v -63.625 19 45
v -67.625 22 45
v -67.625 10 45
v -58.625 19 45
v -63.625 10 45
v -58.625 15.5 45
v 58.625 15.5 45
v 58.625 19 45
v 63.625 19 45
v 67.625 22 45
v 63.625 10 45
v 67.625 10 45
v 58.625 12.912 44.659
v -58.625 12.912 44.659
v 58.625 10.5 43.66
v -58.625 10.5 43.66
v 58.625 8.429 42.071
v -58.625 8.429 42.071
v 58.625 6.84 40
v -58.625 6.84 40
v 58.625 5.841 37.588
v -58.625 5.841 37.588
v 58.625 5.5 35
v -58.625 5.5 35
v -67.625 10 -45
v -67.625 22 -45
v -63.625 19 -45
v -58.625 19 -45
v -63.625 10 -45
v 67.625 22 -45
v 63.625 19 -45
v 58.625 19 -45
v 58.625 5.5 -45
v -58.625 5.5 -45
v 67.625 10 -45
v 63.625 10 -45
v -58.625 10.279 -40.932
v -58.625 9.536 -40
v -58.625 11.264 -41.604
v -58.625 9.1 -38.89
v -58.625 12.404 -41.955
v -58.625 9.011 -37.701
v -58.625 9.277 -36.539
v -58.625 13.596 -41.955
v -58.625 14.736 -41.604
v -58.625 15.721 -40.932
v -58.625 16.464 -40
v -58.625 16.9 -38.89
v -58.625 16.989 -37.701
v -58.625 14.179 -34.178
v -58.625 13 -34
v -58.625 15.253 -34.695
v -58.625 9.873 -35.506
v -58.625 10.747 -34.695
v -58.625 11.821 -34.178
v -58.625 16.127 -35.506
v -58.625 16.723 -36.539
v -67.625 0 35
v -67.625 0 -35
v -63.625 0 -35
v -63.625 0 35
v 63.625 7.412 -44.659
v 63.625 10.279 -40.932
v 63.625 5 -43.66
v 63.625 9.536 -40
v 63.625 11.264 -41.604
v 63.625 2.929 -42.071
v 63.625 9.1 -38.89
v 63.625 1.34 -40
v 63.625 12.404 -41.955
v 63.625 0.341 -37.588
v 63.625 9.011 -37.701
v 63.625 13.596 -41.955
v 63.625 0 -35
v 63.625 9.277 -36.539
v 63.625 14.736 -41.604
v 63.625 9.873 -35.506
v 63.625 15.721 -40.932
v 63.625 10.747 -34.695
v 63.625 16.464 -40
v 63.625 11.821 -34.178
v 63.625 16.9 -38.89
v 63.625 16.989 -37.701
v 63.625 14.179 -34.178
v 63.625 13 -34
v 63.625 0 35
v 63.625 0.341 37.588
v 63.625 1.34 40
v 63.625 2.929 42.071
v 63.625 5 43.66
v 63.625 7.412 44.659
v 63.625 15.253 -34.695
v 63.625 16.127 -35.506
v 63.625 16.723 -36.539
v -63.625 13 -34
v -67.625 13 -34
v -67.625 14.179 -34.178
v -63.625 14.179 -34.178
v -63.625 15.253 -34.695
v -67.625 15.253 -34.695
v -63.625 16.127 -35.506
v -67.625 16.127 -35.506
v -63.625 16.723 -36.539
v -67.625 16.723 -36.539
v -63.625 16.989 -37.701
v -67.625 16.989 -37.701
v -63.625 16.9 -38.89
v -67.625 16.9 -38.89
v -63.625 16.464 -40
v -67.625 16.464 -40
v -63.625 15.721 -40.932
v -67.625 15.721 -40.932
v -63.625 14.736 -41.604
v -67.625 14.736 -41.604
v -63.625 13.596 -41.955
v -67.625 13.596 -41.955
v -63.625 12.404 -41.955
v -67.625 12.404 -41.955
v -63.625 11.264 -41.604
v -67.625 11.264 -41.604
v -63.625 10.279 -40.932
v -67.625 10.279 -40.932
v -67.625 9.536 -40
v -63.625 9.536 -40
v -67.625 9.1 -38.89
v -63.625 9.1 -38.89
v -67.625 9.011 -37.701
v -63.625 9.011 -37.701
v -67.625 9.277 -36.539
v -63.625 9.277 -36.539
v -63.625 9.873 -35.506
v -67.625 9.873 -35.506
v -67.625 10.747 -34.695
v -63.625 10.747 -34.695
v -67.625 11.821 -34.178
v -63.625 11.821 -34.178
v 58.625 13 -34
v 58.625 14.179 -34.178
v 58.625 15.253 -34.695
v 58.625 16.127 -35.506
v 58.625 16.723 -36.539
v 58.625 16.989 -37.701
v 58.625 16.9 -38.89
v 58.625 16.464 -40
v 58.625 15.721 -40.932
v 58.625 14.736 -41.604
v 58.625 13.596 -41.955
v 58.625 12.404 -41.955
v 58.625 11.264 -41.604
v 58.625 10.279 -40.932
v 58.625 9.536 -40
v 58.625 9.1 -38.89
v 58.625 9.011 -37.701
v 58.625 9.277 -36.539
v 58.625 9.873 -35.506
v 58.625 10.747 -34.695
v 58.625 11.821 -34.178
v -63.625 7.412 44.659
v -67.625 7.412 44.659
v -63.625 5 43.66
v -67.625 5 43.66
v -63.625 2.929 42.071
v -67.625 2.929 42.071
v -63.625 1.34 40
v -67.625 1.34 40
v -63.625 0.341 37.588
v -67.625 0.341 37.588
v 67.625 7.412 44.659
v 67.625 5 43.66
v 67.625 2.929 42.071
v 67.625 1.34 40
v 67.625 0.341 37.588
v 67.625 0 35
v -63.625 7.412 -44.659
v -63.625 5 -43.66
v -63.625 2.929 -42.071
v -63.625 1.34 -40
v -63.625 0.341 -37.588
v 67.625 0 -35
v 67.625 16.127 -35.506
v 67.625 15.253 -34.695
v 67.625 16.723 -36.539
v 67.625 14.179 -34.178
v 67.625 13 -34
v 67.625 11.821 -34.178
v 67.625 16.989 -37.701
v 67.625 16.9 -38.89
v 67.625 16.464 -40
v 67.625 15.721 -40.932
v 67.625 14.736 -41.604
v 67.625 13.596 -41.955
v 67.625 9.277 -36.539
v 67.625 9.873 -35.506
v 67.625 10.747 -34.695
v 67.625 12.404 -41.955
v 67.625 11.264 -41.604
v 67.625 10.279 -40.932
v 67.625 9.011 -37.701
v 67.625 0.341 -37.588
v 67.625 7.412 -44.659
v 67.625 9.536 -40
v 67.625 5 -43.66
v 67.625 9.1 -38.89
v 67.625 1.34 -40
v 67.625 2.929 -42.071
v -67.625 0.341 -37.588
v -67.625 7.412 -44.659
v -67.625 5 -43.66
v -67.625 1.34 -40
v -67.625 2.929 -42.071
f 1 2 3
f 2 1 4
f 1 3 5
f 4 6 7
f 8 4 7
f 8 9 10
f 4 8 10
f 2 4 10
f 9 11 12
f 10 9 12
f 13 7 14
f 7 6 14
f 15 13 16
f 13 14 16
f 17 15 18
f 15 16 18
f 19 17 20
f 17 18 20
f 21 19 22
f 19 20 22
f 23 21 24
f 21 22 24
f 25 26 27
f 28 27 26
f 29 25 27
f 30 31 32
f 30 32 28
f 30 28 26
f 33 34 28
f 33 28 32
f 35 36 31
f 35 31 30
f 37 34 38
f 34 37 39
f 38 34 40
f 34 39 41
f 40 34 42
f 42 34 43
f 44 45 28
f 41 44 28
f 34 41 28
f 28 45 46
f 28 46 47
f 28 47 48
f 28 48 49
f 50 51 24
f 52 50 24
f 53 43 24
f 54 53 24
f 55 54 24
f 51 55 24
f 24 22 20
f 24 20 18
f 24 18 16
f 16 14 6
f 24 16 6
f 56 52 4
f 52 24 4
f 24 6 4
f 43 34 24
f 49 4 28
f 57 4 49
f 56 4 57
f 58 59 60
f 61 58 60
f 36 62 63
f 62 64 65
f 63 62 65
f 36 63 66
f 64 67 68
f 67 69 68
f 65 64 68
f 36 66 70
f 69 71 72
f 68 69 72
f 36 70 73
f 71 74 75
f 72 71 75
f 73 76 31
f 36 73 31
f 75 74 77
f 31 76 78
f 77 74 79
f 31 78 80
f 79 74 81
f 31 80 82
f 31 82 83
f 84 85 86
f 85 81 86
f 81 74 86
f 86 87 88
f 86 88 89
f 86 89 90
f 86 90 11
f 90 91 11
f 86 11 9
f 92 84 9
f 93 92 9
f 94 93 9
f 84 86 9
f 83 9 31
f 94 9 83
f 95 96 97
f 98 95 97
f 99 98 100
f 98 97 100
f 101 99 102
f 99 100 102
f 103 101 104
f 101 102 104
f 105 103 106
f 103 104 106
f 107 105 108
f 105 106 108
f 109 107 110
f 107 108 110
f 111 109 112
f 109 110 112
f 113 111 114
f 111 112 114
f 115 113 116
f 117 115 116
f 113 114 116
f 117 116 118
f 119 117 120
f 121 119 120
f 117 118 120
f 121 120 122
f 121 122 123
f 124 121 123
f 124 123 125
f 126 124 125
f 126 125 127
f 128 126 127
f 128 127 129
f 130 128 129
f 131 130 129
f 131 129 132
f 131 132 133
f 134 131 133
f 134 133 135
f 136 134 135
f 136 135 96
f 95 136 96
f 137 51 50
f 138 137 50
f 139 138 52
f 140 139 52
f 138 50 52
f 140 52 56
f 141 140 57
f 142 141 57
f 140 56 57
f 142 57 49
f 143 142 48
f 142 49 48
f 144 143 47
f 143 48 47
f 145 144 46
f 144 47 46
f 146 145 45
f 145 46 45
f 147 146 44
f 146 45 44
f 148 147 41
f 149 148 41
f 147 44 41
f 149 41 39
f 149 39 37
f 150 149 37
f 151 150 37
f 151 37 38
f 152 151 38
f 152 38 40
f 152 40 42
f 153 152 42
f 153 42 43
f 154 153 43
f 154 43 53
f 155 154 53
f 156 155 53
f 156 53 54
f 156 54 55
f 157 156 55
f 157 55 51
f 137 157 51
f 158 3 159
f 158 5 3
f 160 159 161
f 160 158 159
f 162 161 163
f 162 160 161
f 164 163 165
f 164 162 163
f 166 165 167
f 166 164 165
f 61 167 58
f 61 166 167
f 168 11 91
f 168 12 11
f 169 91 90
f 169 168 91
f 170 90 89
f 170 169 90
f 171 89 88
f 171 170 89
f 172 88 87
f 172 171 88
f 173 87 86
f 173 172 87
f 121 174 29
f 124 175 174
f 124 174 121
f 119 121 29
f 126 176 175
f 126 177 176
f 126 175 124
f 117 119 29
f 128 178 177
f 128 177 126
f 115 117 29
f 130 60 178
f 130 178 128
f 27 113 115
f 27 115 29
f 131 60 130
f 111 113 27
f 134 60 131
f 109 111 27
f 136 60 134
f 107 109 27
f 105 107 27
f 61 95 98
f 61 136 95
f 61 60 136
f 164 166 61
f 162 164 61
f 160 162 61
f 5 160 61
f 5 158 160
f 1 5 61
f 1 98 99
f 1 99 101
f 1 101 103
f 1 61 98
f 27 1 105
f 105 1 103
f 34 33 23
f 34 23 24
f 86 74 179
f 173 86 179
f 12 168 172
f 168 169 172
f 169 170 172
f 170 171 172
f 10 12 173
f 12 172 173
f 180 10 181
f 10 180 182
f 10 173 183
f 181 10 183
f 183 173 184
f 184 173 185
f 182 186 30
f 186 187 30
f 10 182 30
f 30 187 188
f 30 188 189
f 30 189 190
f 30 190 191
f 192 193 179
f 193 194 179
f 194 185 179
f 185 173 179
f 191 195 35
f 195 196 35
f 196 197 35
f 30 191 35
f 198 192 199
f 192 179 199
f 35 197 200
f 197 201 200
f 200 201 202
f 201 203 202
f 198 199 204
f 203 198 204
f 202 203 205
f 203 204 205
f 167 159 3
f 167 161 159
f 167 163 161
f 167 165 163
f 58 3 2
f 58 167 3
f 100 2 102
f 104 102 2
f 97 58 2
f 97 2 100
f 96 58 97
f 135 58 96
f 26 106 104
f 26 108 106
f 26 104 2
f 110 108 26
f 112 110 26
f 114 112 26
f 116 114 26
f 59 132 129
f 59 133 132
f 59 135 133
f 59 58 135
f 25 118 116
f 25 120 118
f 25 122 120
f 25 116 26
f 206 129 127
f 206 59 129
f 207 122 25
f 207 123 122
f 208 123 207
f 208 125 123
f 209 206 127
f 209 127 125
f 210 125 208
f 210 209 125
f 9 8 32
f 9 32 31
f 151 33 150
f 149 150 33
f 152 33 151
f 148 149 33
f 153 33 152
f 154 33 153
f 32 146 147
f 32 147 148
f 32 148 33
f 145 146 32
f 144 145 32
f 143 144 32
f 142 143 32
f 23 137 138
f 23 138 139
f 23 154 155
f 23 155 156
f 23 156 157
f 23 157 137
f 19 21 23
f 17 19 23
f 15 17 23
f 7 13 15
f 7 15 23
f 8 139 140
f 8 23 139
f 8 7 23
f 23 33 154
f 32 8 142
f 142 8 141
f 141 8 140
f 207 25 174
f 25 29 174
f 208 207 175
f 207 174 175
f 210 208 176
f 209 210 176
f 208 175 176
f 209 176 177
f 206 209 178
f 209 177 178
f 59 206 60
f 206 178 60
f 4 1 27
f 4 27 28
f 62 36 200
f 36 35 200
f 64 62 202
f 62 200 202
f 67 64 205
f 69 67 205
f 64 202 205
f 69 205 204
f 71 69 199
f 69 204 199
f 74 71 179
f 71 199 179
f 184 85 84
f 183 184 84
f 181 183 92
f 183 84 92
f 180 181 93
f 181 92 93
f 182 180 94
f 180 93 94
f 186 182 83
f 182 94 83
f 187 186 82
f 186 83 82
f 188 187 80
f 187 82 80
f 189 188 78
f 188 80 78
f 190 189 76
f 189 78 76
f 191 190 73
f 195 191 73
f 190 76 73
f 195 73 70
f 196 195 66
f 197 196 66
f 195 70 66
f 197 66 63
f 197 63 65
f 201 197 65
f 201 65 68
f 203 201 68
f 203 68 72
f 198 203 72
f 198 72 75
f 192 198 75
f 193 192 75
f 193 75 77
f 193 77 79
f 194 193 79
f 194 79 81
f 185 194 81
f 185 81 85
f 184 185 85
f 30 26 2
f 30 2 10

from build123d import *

# Parameters (mm, degrees)
SKETCH1_W           = 135.25
SKETCH1_H           = 90
BOSS_EXTRUDE1_DEPTH = 22
SKETCH4_W           = 5
SKETCH4_H           = 19
CUT_EXTRUDE1_DEPTH  = 91
SKETCH5_W           = 117.25
SKETCH5_H           = 11
CUT_EXTRUDE2_DEPTH  = 91
FILLET1_R           = 10
FILLET2_R           = 10
FILLET3_R           = 10
FILLET4_R           = 10
FILLET5_R           = 10
SKETCH6_R           = 4
CUT_EXTRUDE3_DEPTH  = 136.25


with BuildPart() as part:
    # Sketch1 → Boss-Extrude1 (new body)
    with BuildSketch(Plane(origin=(0, 0, 0), x_dir=(1, 0, 0), z_dir=(0, 1, 0))):
        Rectangle(SKETCH1_W, SKETCH1_H)
    extrude(amount=BOSS_EXTRUDE1_DEPTH)

    # Sketch4 → Cut-Extrude1 (cut, through all)
    with BuildSketch(Plane.XY.offset(45)):
        with Locations((-61.125, 9.5)):
            Rectangle(SKETCH4_W, SKETCH4_H)
        with Locations((61.125, 9.5)):
            Rectangle(SKETCH4_W, SKETCH4_H)
    extrude(amount=-CUT_EXTRUDE1_DEPTH, mode=Mode.SUBTRACT)

    # Sketch5 → Cut-Extrude2 (cut, through all)
    with BuildSketch(Plane(origin=(0, 0, -45), x_dir=(-1, 0, 0), z_dir=(0, 0, -1))):
        Rectangle(SKETCH5_W, SKETCH5_H)
    extrude(amount=-CUT_EXTRUDE2_DEPTH, mode=Mode.SUBTRACT)

    # Fillet1
    fillet1_edges = [part.edges().sort_by_distance(p)[0] for p in [
        (0, 5.5, 45),
    ]]
    fillet(fillet1_edges, radius=FILLET1_R)

    # Fillet2
    fillet2_edges = [part.edges().sort_by_distance(p)[0] for p in [
        (-65.625, 0, 45),
    ]]
    fillet(fillet2_edges, radius=FILLET2_R)

    # Fillet3
    fillet3_edges = [part.edges().sort_by_distance(p)[0] for p in [
        (65.625, 0, 45),
    ]]
    fillet(fillet3_edges, radius=FILLET3_R)

    # Fillet4
    fillet4_edges = [part.edges().sort_by_distance(p)[0] for p in [
        (-65.625, 0, -45),
    ]]
    fillet(fillet4_edges, radius=FILLET4_R)

    # Fillet5
    fillet5_edges = [part.edges().sort_by_distance(p)[0] for p in [
        (65.625, 0, -45),
    ]]
    fillet(fillet5_edges, radius=FILLET5_R)

    # Sketch6 → Cut-Extrude3 (cut, through all)
    with BuildSketch(Plane.ZY.offset(67.625)):
        with Locations((-38, 13)):
            Circle(SKETCH6_R)
    extrude(amount=-CUT_EXTRUDE3_DEPTH, mode=Mode.SUBTRACT)


solid = part.part
